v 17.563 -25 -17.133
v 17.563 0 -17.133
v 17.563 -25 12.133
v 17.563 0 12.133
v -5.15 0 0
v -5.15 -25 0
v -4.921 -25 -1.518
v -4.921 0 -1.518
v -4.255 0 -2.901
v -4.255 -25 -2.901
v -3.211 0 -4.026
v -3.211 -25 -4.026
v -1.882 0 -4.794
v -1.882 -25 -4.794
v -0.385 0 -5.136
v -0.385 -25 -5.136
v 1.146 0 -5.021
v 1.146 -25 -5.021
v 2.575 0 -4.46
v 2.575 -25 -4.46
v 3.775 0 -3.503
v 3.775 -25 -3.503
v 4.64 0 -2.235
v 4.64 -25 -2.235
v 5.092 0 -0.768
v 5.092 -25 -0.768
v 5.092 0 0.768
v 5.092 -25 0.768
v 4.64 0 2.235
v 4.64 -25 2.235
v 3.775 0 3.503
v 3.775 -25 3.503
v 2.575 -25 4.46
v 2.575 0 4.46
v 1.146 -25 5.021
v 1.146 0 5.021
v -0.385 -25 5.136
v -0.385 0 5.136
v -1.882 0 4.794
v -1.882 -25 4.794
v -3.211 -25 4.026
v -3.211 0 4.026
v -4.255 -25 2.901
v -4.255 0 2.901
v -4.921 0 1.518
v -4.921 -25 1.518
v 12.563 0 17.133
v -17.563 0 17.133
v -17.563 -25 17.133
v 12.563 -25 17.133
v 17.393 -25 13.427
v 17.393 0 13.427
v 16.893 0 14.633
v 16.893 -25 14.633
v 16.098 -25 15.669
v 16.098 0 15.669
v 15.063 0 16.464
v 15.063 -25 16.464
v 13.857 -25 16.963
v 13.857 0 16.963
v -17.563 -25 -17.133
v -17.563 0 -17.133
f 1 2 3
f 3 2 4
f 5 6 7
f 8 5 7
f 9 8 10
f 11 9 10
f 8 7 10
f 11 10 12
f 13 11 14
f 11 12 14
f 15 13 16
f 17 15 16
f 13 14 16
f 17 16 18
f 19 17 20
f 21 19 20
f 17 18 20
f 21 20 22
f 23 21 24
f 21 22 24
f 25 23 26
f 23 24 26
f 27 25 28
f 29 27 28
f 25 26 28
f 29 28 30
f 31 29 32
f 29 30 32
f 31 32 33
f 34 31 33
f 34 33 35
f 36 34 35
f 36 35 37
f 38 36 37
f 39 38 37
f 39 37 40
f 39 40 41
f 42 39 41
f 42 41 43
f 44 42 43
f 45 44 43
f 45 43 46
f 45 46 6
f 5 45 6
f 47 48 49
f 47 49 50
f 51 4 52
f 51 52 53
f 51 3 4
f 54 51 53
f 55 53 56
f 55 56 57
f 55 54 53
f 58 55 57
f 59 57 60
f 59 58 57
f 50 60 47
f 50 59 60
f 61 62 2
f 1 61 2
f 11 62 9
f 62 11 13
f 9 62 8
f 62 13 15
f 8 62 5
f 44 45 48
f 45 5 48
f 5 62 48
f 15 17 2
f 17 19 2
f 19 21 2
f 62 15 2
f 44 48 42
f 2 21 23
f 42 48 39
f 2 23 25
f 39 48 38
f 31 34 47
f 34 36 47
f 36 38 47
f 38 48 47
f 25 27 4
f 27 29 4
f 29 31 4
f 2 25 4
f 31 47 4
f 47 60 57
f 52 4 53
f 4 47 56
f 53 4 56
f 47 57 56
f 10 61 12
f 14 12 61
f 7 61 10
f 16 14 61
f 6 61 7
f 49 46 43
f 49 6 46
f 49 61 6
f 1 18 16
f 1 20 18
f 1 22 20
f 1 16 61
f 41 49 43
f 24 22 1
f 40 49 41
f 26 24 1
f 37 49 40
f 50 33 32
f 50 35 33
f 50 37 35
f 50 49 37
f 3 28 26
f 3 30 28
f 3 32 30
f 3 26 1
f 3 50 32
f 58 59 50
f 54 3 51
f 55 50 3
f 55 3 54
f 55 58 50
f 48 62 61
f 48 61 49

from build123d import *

# Parameters (mm, degrees)
F0_W     = 35.12583673
F0_H     = 34.2667922378
F1_DEPTH = 25
F2_R     = 5
F3_D     = 10.3


with BuildPart() as f1:
    # F0 (on Front) → F1 (new body)
    with BuildSketch(Plane.XZ):
        Rectangle(F0_W, F0_H)
    extrude(amount=F1_DEPTH)

    # F2
    f2_edges = [f1.edges().sort_by_distance(p)[0] for p in [
        (17.562918, -12.5, 17.133396),
    ]]
    fillet(f2_edges, radius=F2_R)

    # F3 (through all)
    with Locations(Plane(origin=(0, 0, 0), x_dir=(1, 0, 0), z_dir=(0, 1, 0))):
        with Locations((0, 0)):
            Hole(F3_D / 2)


solid = f1.part
